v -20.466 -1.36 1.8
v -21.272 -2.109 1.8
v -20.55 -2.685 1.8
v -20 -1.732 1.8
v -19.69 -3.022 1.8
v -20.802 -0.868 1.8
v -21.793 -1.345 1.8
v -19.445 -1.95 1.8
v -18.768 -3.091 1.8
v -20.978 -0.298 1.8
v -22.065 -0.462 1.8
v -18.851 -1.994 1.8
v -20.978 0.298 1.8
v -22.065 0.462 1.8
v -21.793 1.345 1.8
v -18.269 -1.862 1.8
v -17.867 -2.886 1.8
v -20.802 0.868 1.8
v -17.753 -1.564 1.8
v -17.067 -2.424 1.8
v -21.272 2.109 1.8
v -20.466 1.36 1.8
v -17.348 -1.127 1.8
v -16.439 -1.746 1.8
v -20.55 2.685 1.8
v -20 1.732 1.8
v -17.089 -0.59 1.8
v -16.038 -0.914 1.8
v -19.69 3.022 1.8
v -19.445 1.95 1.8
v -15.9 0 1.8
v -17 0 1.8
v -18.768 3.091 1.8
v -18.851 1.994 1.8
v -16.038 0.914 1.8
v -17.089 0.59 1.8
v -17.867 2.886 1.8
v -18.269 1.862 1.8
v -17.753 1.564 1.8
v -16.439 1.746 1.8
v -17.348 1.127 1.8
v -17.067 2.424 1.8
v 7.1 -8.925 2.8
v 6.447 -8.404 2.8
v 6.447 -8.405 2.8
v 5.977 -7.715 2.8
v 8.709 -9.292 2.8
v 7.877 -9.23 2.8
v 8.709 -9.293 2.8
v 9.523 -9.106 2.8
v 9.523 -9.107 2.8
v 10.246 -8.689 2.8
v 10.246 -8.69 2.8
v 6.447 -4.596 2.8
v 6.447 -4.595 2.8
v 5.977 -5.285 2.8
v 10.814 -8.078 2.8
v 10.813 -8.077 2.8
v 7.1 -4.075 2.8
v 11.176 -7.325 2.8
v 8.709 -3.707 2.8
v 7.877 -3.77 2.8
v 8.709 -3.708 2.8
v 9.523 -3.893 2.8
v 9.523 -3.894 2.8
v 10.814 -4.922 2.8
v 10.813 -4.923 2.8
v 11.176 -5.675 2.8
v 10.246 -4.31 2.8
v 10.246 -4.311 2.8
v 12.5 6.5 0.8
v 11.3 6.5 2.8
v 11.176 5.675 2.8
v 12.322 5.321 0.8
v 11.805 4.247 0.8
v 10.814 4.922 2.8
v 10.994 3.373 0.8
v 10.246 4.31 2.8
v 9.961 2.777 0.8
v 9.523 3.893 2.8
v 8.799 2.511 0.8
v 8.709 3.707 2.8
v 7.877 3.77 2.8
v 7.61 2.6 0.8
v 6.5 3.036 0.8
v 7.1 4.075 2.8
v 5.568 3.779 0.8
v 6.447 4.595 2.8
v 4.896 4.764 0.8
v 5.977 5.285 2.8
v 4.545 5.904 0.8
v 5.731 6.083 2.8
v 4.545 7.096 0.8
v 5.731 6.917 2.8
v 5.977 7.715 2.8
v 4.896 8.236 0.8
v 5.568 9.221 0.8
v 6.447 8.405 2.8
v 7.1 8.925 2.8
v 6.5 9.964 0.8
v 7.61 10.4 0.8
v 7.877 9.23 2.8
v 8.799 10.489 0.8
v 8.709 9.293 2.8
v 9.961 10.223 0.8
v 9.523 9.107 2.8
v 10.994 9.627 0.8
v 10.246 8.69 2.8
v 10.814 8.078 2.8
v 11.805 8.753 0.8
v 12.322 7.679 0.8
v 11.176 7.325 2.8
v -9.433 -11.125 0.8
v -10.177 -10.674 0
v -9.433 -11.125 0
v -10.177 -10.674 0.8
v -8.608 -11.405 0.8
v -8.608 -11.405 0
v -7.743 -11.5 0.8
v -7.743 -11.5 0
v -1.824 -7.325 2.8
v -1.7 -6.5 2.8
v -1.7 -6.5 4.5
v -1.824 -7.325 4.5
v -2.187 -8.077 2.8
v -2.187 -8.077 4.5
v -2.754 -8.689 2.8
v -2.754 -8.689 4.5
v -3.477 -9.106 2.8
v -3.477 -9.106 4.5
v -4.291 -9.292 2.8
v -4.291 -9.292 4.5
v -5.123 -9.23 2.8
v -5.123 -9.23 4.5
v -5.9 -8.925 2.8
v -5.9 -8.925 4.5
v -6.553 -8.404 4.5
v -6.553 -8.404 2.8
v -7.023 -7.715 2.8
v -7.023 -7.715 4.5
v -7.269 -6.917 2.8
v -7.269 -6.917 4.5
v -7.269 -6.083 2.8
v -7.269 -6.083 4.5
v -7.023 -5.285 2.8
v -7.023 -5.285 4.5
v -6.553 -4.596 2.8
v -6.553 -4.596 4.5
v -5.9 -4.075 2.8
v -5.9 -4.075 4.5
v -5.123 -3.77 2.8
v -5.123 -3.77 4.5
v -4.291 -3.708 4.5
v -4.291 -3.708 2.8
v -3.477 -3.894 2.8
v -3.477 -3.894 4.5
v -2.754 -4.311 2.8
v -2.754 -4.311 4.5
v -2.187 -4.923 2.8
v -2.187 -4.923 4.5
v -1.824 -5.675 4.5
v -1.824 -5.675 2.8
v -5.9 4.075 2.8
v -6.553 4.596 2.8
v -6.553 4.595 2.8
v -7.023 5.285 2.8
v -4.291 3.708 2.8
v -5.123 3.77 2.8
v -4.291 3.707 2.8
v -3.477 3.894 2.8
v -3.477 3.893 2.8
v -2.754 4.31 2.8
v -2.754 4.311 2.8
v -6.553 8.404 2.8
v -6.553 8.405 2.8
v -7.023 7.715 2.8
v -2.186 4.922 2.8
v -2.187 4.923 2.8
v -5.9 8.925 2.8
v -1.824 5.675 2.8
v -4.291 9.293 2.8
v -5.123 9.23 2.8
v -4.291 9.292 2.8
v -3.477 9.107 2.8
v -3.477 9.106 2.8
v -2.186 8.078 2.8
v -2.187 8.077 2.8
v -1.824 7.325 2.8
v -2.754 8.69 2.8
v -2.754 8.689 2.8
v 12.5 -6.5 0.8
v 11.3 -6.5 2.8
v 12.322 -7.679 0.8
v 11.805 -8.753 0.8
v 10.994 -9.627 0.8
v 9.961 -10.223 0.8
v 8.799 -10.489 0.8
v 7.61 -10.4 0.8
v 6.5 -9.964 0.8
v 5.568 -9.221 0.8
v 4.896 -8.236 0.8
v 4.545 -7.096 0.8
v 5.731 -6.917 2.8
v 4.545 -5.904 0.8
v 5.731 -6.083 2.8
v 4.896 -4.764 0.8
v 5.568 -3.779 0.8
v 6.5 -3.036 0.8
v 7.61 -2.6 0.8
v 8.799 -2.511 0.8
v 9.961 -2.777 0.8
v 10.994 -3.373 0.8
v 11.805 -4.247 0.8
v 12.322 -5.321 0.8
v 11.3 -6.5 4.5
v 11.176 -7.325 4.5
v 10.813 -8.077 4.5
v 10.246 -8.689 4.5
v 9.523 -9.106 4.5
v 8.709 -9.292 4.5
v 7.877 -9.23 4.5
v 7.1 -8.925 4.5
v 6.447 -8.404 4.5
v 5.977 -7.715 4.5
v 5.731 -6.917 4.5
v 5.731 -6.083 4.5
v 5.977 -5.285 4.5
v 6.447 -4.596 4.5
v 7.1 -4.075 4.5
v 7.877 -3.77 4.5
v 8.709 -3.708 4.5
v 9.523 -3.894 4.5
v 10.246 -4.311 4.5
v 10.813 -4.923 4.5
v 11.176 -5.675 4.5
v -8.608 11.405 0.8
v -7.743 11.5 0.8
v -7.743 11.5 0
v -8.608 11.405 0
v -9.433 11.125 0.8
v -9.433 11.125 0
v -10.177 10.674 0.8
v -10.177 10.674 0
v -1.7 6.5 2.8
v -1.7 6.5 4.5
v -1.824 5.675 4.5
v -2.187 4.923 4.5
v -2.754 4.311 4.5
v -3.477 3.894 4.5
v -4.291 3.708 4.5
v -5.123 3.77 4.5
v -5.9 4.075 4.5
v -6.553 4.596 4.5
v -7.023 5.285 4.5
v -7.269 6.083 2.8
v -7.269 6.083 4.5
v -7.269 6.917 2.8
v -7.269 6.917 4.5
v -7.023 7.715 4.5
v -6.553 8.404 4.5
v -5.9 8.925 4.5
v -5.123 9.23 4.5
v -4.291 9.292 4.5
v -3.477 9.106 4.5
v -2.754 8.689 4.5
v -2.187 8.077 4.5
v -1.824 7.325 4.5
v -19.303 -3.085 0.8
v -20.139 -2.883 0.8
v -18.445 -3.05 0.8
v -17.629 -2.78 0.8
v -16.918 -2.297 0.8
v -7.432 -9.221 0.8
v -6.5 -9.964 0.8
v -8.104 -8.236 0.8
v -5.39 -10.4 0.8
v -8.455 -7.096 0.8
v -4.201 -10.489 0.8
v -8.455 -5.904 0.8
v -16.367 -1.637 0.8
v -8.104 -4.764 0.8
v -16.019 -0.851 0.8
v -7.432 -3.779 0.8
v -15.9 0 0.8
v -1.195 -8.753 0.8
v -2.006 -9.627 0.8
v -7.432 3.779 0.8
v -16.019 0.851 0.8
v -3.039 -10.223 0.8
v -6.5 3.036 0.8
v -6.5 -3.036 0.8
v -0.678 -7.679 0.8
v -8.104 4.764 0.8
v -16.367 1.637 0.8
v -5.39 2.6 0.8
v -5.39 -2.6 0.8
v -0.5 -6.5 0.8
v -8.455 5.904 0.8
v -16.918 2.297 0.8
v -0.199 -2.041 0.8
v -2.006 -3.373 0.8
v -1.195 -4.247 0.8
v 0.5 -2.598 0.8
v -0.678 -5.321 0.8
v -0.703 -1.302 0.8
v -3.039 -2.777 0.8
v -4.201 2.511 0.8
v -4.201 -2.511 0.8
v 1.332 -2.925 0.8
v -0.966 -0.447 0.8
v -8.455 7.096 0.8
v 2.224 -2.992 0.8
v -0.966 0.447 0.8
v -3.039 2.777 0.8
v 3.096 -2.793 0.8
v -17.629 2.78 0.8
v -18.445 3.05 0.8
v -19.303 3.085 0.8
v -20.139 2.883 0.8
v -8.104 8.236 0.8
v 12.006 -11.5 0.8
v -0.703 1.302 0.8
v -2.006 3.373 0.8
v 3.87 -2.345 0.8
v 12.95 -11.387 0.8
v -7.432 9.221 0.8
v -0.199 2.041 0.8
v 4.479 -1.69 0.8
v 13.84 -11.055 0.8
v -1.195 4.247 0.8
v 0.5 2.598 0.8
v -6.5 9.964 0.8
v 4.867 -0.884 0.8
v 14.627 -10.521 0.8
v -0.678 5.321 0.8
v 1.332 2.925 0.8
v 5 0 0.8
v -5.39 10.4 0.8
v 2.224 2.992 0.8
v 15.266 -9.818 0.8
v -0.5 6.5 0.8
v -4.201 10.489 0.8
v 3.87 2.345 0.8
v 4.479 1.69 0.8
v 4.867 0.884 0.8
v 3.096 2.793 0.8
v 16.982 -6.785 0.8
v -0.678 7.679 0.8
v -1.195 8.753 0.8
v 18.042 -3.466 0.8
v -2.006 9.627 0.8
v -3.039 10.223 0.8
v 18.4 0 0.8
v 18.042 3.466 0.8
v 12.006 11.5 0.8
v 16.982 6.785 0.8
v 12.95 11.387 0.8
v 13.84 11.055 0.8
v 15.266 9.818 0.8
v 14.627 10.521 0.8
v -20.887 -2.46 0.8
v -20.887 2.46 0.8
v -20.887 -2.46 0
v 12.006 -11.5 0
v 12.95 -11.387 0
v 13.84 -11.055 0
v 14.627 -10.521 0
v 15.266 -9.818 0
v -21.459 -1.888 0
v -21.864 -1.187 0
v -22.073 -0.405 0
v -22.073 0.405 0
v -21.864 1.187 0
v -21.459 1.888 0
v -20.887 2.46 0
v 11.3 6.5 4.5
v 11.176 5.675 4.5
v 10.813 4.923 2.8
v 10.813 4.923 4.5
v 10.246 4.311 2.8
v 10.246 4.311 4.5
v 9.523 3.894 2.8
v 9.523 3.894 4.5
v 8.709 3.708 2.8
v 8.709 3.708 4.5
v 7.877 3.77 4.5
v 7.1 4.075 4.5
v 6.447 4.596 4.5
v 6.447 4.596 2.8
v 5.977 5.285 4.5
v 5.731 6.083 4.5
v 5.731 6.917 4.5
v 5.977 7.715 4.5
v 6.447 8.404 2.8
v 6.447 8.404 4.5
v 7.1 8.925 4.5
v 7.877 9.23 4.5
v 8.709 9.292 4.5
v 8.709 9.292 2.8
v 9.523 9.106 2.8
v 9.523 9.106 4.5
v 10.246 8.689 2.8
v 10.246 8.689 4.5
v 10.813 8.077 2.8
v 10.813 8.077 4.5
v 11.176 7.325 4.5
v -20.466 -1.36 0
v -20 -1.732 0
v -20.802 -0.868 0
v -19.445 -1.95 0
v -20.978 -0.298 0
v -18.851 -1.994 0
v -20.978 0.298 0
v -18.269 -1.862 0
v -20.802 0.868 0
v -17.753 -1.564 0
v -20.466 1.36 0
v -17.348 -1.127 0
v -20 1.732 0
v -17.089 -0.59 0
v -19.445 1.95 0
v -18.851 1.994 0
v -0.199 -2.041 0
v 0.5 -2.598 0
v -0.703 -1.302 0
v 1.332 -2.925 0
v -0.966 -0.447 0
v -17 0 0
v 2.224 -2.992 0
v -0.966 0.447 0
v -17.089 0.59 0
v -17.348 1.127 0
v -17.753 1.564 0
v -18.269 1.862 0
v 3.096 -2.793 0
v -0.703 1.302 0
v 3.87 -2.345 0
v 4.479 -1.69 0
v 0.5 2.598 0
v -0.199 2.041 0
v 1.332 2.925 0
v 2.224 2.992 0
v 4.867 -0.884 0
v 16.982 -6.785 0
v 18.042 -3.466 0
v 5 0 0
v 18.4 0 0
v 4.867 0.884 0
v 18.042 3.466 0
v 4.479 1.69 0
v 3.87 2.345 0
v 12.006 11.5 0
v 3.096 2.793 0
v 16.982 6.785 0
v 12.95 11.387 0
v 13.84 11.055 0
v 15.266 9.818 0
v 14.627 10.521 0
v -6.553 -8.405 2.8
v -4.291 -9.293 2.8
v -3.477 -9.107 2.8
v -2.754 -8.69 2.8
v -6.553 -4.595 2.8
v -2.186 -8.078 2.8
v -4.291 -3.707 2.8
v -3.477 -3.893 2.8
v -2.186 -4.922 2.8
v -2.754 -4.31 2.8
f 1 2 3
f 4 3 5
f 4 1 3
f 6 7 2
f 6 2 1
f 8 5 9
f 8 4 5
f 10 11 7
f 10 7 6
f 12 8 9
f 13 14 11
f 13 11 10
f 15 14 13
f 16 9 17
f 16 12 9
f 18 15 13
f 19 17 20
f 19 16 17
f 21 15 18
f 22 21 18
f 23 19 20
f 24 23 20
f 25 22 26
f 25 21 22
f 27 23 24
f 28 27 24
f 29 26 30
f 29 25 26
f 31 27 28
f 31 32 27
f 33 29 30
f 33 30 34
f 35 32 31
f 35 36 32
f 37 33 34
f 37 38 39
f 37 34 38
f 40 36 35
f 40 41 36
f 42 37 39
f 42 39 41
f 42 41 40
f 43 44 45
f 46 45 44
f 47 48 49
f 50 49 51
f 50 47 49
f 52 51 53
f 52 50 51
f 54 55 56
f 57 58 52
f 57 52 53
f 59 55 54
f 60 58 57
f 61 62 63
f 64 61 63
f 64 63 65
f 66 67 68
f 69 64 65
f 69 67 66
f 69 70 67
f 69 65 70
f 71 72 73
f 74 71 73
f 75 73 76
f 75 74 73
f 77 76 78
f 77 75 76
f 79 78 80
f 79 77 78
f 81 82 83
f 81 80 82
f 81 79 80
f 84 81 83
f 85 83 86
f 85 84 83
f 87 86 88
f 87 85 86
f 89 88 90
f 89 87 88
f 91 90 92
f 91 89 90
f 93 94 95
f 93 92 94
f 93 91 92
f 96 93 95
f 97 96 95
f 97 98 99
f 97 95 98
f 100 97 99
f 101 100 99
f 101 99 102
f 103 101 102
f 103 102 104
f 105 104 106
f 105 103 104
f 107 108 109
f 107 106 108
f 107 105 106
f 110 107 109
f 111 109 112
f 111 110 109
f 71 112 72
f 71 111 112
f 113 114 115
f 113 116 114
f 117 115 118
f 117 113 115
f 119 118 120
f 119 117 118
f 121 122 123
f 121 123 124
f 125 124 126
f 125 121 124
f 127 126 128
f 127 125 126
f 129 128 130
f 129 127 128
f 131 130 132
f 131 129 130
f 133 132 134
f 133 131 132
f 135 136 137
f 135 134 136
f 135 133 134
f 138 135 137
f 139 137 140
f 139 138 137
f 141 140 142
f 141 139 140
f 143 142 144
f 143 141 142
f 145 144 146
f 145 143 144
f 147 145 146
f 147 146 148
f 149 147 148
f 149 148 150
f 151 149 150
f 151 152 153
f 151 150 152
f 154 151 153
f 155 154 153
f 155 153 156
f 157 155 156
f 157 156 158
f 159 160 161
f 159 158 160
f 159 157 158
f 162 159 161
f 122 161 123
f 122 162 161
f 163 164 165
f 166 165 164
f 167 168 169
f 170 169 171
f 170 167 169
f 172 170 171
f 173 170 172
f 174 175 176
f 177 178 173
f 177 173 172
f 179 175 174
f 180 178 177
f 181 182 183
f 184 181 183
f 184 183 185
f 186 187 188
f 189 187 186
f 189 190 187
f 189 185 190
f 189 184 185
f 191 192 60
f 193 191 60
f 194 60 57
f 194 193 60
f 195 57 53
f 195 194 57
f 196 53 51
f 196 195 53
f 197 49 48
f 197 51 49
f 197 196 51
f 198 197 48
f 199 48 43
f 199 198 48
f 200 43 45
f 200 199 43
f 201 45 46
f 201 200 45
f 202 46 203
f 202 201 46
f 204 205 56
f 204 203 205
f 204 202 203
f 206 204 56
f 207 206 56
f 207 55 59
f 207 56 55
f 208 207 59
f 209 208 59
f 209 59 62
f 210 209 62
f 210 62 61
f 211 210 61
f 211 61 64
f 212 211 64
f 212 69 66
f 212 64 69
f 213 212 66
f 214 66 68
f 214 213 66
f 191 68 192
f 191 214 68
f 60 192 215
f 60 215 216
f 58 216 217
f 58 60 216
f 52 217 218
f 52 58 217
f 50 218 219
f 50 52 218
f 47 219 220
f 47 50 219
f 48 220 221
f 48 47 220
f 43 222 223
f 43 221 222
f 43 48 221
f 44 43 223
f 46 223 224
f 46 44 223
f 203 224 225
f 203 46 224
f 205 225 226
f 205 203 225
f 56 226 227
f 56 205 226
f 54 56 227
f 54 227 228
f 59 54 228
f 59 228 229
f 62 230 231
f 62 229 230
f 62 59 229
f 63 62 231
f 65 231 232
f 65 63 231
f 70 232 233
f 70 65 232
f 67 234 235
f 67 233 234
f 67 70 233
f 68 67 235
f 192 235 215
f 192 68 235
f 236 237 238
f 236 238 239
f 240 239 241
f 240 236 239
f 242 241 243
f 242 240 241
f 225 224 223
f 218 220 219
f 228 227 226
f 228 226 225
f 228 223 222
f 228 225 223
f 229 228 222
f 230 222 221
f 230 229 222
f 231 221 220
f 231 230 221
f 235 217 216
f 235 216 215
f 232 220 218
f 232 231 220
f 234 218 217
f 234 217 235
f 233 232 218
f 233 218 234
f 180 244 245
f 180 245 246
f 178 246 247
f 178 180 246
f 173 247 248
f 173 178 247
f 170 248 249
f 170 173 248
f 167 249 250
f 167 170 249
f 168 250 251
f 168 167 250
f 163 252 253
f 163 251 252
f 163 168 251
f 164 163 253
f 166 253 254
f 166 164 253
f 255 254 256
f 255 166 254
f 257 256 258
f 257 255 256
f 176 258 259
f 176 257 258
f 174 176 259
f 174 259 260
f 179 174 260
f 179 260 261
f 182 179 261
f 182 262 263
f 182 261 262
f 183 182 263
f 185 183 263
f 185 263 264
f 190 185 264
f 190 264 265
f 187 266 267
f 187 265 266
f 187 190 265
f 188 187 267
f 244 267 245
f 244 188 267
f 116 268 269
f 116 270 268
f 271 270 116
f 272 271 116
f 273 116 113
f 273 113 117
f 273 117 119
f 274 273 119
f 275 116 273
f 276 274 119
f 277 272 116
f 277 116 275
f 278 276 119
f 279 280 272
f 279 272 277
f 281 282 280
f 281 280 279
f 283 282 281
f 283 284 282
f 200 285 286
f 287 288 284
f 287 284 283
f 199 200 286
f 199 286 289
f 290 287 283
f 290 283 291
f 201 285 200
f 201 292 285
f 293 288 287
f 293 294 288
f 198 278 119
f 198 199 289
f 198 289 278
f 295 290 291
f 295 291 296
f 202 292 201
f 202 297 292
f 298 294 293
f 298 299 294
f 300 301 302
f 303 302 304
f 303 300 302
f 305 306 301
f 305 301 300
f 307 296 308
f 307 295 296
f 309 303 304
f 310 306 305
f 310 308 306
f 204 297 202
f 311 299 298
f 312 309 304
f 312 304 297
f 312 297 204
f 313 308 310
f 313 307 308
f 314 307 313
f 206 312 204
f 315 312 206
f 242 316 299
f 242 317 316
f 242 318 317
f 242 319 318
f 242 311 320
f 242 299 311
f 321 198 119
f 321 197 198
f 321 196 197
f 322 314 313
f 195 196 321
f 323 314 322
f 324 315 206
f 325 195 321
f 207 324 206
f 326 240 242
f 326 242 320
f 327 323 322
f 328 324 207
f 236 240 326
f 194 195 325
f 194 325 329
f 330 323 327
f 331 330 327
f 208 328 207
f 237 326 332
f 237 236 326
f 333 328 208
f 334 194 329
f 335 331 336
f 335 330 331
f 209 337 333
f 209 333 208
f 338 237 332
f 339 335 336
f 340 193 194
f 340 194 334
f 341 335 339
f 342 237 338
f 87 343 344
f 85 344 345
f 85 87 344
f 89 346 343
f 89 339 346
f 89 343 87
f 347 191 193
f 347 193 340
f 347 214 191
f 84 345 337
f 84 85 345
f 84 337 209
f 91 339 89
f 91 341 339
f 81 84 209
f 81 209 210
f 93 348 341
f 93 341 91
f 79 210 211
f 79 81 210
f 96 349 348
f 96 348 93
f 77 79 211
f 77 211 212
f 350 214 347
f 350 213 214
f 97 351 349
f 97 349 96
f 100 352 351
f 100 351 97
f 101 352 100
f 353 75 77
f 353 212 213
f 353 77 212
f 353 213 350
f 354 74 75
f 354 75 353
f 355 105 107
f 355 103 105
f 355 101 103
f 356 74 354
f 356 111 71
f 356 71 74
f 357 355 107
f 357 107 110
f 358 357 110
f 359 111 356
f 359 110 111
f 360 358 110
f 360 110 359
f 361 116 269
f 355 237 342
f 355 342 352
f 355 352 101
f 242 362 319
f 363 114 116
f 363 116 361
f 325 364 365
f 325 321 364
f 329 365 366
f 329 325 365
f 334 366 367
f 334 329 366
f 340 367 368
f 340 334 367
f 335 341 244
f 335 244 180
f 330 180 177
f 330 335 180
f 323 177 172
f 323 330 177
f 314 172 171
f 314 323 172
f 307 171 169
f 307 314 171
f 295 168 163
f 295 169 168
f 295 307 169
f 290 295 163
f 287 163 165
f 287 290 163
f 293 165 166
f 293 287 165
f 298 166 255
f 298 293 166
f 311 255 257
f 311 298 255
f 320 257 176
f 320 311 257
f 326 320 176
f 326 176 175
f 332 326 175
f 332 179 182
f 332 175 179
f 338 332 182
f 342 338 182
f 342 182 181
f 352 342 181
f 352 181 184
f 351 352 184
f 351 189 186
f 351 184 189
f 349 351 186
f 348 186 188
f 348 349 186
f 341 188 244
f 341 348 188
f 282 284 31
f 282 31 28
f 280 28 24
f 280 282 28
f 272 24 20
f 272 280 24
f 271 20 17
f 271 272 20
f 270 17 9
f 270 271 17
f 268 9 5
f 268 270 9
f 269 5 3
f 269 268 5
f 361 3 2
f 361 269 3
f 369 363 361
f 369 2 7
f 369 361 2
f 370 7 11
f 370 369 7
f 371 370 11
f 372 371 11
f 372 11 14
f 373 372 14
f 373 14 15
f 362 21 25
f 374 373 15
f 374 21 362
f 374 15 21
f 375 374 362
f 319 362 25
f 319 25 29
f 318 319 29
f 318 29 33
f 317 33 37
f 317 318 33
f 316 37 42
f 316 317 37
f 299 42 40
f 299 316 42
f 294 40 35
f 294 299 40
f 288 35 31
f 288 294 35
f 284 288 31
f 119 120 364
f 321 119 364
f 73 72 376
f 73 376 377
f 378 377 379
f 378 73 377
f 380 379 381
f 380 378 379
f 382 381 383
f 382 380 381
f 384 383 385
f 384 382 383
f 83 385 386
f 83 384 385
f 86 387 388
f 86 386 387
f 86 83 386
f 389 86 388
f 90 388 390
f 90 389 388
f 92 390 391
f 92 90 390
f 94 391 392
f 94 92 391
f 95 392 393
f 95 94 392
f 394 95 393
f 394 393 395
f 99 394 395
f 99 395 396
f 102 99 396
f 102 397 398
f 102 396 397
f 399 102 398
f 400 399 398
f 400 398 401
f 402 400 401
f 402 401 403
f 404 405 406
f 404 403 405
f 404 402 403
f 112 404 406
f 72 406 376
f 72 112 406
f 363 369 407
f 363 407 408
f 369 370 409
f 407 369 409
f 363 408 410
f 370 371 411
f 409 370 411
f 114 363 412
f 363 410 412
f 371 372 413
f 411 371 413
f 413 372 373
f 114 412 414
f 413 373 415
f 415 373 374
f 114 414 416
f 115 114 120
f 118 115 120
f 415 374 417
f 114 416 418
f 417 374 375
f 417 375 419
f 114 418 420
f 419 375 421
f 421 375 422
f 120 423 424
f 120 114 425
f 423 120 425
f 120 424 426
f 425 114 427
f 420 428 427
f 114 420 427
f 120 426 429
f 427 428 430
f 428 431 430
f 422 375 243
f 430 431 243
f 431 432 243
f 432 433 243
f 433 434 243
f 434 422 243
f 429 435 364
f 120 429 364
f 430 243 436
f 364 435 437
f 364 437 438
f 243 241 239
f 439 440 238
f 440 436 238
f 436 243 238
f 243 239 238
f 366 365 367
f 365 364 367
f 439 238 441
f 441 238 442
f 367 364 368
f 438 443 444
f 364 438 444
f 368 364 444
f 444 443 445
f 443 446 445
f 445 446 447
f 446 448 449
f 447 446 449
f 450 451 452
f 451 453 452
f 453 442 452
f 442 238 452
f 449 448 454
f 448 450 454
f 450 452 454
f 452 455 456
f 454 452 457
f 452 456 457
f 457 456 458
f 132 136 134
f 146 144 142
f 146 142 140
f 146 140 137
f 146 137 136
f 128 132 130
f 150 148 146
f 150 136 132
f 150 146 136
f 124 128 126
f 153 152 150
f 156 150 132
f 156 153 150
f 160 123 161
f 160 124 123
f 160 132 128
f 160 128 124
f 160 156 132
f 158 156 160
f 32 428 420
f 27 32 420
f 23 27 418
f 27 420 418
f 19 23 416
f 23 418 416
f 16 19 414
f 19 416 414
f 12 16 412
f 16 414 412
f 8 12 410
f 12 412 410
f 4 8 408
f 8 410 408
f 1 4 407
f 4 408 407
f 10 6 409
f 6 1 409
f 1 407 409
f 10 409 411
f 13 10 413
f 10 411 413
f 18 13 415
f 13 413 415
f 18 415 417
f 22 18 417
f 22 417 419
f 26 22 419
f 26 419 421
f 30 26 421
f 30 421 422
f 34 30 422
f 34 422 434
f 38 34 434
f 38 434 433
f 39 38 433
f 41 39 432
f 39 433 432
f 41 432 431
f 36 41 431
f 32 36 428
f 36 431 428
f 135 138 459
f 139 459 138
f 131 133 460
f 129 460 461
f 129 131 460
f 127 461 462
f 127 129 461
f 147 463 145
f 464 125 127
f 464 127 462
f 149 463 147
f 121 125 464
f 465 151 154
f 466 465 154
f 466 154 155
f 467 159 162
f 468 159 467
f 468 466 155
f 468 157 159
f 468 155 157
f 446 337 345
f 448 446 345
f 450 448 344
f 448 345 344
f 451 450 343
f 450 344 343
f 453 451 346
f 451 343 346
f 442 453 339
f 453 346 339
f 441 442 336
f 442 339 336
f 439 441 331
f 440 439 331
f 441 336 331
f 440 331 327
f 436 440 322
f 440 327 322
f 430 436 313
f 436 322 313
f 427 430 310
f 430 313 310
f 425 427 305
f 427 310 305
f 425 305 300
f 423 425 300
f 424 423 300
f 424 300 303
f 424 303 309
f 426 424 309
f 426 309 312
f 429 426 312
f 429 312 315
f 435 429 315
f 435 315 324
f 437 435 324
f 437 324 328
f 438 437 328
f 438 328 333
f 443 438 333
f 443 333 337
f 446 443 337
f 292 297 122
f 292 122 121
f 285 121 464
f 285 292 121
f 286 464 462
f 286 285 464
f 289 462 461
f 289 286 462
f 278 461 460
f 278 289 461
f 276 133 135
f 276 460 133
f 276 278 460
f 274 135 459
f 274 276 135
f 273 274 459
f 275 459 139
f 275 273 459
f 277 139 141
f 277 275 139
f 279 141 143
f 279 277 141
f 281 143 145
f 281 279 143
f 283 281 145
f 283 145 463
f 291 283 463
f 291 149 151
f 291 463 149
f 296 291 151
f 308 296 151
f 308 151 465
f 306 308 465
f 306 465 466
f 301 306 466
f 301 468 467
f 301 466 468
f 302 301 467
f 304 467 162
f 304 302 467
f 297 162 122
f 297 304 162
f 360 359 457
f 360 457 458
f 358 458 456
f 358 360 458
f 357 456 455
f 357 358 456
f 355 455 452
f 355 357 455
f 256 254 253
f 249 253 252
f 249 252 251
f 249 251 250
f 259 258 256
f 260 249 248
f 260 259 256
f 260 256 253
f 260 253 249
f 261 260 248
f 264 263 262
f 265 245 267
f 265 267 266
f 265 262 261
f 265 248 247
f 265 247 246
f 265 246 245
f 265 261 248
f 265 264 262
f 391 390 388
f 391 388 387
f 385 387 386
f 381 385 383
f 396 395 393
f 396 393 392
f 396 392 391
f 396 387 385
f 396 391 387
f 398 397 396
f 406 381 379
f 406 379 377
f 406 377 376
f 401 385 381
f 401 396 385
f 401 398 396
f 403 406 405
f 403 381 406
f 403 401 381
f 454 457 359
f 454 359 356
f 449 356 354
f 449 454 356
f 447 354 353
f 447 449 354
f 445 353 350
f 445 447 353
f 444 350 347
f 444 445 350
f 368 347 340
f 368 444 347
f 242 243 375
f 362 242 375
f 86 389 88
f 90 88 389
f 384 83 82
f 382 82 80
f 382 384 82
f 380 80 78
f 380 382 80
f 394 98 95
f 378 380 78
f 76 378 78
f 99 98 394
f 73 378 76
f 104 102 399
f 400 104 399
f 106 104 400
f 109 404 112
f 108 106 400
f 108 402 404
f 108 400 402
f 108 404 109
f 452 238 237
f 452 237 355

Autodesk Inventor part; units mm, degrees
ref_plane "YZ Plane" through (0, 0, 0) normal (1, 0, 0) x (0, 1, 0)
ref_plane "XZ Plane" through (0, 0, 0) normal (0, 1, 0) x (-1, 0, 0)
ref_plane "XY Plane" through (0, 0, 0) normal (0, 0, 1) x (1, 0, 0)
sketch "Esquisse1" plane through (0, 0, 0) normal (0, 0, 1) x (1, 0, 0)
  line L0 (-9.1, 11.5) -> (13.9, 11.5)
  circle A0 centre (-19, 0) radius 3.1
  line L1 (-9.1, -11.5) -> (13.9, -11.5)
  line L2 (-9.1, -11.5) -> (-20.8866, -2.4598)
  arc A1 (13.9, -11.5) -> (13.9, 11.5) centre (1.4556, 0) ccw
  circle A2 centre (-19, 0) radius 2
  line L3 (-9.1, 11.5) -> (-20.8866, 2.4598)
  point P0 (0, 0)
  dimension "d0" = 6.2
  dimension "d1" = 23
  dimension "d2" = 23
  dimension "d3" = 23
  dimension "d4" = 11.5
  dimension "d5" = 11.5
  dimension "d6" = 9.9
  dimension "d7" = 9.9
  dimension "d8" = 19
  dimension "d9" = 40.5
  dimension "d10" = 4
extrude "Extrusion1" add sketch "Esquisse1" along normal blind 0.8
fillet "Congé1" radius 4 2 edges at (13.9, -11.5, 0.4) (13.9, 11.5, 0.4)
fillet "Congé2" radius 4 2 edges at (-9.1, 11.5, 0.4) (-9.1, -11.5, 0.4)
sketch "Esquisse3" plane through (0, 0, 0.8) normal (0, 0, 1) x (1, 0, 0)
  circle A0 centre (-19, 0) radius 2
  circle A1 centre (-19, 0) radius 3.1
  circle A2 centre (-19, 0) radius 2 projected
  point P0 (0, 0)
  dimension "d16" = 4
  dimension "d17" = 6.2
extrude "Extrusion2" add sketch "Esquisse3" along normal blind 1
sketch "Esquisse4" plane through (0, 0, 0.8) normal (0, 0, 1) x (1, 0, 0)
  circle A0 centre (2, 0) radius 3
  line L0 (12.0058, 11.5) -> (-7.7427, 11.5) projected
  circle A1 centre (-19, 0) radius 2 projected
  point P0 (0, 0)
  dimension "d20" = 6
  dimension "d21" = 11.5
  dimension "d22" = 21
extrude "Extrusion3" cut sketch "Esquisse4" against normal through all contours A0
sketch "Esquisse5" plane through (0, 0, 0.8) normal (0, 0, 1) x (1, 0, 0)
  circle A0 centre (-4.5, 6.5) radius 4
  circle A1 centre (8.5, 6.5) radius 4
  circle A2 centre (8.5, -6.5) radius 4
  circle A3 centre (-4.5, -6.5) radius 4
  circle A4 centre (2, 0) radius 3 projected
  point P0 (0, 0)
  dimension "d25" = 8
  dimension "d26" = 8
  dimension "d27" = 8
  dimension "d28" = 8
  dimension "d29" = 13
  dimension "d30" = 13
  dimension "d31" = 6.5
  dimension "d32" = 6.5
  dimension "d34" = 6.5
  dimension "d35" = 6.5
  dimension "d36" = 13
  dimension "d37" = 6.5
extrude "Extrusion4" add sketch "Esquisse5" along normal blind 2 contours A0 | A1 | A2 | A3
sketch "Esquisse7" plane through (-4.5, 6.5, 2.8) normal (0, 0, 1) x (1, 0, 0)
  circle A0 centre (0, 0) radius 2.8
  circle A1 centre (13, 0) radius 2.8
  circle A2 centre (13, -13) radius 2.8
  circle A3 centre (0, -13) radius 2.8
  circle A4 centre (0, 0) radius 4 projected
  circle A5 centre (13, 0) radius 4 projected
  circle A6 centre (13, -13) radius 4 projected
  circle A7 centre (0, -13) radius 4 projected
  point P0 (4.5, -6.5)
  dimension "d49" = 5.6
  dimension "d50" = 5.6
  dimension "d51" = 5.6
  dimension "d52" = 5.6
extrude "Extrusion6" add sketch "Esquisse7" along normal blind 1.7 contours A0 | A1 | A2 | A3
chamfer "Chanfrein2" distance 1.2 distance2 2 1 edges at (-8.5, 6.5, 2.8) measured on face at (-0.9659, 5.9576, 2.8)
chamfer "Chanfrein3" distance 1.2 distance2 2 1 edges at (4.5, 6.5, 2.8) measured on face at (12.0613, 6.1809, 2.8)
chamfer "Chanfrein4" distance 1.2 distance2 2 1 edges at (-8.5, -6.5, 2.8) measured on face at (-0.9659, -7.0424, 2.8)
chamfer "Chanfrein5" distance 1.2 distance2 2 1 edges at (4.5, -6.5, 2.8) measured on face at (12.0341, -7.0424, 2.8)
equation "\"d3\" = d2"
equation "\"d4\" = 0.5 * d1"
equation "\"d5\" = d4"
equation "\"d26\" = d25"
equation "\"d27\" = d25"
equation "\"d28\" = d25"
equation "\"d30\" = d29"
equation "\"d31\" = 0.5 * d29"
equation "\"d32\" = d31"
equation "\"d34\" = d32"
equation "\"d35\" = d32"
equation "\"d36\" = d29"
equation "\"d37\" = d32"
equation "\"d50\" = d49"
equation "\"d51\" = d49"
equation "\"d52\" = d49"
properties part number "Membrane-DPAD" material "Caoutchouc"
